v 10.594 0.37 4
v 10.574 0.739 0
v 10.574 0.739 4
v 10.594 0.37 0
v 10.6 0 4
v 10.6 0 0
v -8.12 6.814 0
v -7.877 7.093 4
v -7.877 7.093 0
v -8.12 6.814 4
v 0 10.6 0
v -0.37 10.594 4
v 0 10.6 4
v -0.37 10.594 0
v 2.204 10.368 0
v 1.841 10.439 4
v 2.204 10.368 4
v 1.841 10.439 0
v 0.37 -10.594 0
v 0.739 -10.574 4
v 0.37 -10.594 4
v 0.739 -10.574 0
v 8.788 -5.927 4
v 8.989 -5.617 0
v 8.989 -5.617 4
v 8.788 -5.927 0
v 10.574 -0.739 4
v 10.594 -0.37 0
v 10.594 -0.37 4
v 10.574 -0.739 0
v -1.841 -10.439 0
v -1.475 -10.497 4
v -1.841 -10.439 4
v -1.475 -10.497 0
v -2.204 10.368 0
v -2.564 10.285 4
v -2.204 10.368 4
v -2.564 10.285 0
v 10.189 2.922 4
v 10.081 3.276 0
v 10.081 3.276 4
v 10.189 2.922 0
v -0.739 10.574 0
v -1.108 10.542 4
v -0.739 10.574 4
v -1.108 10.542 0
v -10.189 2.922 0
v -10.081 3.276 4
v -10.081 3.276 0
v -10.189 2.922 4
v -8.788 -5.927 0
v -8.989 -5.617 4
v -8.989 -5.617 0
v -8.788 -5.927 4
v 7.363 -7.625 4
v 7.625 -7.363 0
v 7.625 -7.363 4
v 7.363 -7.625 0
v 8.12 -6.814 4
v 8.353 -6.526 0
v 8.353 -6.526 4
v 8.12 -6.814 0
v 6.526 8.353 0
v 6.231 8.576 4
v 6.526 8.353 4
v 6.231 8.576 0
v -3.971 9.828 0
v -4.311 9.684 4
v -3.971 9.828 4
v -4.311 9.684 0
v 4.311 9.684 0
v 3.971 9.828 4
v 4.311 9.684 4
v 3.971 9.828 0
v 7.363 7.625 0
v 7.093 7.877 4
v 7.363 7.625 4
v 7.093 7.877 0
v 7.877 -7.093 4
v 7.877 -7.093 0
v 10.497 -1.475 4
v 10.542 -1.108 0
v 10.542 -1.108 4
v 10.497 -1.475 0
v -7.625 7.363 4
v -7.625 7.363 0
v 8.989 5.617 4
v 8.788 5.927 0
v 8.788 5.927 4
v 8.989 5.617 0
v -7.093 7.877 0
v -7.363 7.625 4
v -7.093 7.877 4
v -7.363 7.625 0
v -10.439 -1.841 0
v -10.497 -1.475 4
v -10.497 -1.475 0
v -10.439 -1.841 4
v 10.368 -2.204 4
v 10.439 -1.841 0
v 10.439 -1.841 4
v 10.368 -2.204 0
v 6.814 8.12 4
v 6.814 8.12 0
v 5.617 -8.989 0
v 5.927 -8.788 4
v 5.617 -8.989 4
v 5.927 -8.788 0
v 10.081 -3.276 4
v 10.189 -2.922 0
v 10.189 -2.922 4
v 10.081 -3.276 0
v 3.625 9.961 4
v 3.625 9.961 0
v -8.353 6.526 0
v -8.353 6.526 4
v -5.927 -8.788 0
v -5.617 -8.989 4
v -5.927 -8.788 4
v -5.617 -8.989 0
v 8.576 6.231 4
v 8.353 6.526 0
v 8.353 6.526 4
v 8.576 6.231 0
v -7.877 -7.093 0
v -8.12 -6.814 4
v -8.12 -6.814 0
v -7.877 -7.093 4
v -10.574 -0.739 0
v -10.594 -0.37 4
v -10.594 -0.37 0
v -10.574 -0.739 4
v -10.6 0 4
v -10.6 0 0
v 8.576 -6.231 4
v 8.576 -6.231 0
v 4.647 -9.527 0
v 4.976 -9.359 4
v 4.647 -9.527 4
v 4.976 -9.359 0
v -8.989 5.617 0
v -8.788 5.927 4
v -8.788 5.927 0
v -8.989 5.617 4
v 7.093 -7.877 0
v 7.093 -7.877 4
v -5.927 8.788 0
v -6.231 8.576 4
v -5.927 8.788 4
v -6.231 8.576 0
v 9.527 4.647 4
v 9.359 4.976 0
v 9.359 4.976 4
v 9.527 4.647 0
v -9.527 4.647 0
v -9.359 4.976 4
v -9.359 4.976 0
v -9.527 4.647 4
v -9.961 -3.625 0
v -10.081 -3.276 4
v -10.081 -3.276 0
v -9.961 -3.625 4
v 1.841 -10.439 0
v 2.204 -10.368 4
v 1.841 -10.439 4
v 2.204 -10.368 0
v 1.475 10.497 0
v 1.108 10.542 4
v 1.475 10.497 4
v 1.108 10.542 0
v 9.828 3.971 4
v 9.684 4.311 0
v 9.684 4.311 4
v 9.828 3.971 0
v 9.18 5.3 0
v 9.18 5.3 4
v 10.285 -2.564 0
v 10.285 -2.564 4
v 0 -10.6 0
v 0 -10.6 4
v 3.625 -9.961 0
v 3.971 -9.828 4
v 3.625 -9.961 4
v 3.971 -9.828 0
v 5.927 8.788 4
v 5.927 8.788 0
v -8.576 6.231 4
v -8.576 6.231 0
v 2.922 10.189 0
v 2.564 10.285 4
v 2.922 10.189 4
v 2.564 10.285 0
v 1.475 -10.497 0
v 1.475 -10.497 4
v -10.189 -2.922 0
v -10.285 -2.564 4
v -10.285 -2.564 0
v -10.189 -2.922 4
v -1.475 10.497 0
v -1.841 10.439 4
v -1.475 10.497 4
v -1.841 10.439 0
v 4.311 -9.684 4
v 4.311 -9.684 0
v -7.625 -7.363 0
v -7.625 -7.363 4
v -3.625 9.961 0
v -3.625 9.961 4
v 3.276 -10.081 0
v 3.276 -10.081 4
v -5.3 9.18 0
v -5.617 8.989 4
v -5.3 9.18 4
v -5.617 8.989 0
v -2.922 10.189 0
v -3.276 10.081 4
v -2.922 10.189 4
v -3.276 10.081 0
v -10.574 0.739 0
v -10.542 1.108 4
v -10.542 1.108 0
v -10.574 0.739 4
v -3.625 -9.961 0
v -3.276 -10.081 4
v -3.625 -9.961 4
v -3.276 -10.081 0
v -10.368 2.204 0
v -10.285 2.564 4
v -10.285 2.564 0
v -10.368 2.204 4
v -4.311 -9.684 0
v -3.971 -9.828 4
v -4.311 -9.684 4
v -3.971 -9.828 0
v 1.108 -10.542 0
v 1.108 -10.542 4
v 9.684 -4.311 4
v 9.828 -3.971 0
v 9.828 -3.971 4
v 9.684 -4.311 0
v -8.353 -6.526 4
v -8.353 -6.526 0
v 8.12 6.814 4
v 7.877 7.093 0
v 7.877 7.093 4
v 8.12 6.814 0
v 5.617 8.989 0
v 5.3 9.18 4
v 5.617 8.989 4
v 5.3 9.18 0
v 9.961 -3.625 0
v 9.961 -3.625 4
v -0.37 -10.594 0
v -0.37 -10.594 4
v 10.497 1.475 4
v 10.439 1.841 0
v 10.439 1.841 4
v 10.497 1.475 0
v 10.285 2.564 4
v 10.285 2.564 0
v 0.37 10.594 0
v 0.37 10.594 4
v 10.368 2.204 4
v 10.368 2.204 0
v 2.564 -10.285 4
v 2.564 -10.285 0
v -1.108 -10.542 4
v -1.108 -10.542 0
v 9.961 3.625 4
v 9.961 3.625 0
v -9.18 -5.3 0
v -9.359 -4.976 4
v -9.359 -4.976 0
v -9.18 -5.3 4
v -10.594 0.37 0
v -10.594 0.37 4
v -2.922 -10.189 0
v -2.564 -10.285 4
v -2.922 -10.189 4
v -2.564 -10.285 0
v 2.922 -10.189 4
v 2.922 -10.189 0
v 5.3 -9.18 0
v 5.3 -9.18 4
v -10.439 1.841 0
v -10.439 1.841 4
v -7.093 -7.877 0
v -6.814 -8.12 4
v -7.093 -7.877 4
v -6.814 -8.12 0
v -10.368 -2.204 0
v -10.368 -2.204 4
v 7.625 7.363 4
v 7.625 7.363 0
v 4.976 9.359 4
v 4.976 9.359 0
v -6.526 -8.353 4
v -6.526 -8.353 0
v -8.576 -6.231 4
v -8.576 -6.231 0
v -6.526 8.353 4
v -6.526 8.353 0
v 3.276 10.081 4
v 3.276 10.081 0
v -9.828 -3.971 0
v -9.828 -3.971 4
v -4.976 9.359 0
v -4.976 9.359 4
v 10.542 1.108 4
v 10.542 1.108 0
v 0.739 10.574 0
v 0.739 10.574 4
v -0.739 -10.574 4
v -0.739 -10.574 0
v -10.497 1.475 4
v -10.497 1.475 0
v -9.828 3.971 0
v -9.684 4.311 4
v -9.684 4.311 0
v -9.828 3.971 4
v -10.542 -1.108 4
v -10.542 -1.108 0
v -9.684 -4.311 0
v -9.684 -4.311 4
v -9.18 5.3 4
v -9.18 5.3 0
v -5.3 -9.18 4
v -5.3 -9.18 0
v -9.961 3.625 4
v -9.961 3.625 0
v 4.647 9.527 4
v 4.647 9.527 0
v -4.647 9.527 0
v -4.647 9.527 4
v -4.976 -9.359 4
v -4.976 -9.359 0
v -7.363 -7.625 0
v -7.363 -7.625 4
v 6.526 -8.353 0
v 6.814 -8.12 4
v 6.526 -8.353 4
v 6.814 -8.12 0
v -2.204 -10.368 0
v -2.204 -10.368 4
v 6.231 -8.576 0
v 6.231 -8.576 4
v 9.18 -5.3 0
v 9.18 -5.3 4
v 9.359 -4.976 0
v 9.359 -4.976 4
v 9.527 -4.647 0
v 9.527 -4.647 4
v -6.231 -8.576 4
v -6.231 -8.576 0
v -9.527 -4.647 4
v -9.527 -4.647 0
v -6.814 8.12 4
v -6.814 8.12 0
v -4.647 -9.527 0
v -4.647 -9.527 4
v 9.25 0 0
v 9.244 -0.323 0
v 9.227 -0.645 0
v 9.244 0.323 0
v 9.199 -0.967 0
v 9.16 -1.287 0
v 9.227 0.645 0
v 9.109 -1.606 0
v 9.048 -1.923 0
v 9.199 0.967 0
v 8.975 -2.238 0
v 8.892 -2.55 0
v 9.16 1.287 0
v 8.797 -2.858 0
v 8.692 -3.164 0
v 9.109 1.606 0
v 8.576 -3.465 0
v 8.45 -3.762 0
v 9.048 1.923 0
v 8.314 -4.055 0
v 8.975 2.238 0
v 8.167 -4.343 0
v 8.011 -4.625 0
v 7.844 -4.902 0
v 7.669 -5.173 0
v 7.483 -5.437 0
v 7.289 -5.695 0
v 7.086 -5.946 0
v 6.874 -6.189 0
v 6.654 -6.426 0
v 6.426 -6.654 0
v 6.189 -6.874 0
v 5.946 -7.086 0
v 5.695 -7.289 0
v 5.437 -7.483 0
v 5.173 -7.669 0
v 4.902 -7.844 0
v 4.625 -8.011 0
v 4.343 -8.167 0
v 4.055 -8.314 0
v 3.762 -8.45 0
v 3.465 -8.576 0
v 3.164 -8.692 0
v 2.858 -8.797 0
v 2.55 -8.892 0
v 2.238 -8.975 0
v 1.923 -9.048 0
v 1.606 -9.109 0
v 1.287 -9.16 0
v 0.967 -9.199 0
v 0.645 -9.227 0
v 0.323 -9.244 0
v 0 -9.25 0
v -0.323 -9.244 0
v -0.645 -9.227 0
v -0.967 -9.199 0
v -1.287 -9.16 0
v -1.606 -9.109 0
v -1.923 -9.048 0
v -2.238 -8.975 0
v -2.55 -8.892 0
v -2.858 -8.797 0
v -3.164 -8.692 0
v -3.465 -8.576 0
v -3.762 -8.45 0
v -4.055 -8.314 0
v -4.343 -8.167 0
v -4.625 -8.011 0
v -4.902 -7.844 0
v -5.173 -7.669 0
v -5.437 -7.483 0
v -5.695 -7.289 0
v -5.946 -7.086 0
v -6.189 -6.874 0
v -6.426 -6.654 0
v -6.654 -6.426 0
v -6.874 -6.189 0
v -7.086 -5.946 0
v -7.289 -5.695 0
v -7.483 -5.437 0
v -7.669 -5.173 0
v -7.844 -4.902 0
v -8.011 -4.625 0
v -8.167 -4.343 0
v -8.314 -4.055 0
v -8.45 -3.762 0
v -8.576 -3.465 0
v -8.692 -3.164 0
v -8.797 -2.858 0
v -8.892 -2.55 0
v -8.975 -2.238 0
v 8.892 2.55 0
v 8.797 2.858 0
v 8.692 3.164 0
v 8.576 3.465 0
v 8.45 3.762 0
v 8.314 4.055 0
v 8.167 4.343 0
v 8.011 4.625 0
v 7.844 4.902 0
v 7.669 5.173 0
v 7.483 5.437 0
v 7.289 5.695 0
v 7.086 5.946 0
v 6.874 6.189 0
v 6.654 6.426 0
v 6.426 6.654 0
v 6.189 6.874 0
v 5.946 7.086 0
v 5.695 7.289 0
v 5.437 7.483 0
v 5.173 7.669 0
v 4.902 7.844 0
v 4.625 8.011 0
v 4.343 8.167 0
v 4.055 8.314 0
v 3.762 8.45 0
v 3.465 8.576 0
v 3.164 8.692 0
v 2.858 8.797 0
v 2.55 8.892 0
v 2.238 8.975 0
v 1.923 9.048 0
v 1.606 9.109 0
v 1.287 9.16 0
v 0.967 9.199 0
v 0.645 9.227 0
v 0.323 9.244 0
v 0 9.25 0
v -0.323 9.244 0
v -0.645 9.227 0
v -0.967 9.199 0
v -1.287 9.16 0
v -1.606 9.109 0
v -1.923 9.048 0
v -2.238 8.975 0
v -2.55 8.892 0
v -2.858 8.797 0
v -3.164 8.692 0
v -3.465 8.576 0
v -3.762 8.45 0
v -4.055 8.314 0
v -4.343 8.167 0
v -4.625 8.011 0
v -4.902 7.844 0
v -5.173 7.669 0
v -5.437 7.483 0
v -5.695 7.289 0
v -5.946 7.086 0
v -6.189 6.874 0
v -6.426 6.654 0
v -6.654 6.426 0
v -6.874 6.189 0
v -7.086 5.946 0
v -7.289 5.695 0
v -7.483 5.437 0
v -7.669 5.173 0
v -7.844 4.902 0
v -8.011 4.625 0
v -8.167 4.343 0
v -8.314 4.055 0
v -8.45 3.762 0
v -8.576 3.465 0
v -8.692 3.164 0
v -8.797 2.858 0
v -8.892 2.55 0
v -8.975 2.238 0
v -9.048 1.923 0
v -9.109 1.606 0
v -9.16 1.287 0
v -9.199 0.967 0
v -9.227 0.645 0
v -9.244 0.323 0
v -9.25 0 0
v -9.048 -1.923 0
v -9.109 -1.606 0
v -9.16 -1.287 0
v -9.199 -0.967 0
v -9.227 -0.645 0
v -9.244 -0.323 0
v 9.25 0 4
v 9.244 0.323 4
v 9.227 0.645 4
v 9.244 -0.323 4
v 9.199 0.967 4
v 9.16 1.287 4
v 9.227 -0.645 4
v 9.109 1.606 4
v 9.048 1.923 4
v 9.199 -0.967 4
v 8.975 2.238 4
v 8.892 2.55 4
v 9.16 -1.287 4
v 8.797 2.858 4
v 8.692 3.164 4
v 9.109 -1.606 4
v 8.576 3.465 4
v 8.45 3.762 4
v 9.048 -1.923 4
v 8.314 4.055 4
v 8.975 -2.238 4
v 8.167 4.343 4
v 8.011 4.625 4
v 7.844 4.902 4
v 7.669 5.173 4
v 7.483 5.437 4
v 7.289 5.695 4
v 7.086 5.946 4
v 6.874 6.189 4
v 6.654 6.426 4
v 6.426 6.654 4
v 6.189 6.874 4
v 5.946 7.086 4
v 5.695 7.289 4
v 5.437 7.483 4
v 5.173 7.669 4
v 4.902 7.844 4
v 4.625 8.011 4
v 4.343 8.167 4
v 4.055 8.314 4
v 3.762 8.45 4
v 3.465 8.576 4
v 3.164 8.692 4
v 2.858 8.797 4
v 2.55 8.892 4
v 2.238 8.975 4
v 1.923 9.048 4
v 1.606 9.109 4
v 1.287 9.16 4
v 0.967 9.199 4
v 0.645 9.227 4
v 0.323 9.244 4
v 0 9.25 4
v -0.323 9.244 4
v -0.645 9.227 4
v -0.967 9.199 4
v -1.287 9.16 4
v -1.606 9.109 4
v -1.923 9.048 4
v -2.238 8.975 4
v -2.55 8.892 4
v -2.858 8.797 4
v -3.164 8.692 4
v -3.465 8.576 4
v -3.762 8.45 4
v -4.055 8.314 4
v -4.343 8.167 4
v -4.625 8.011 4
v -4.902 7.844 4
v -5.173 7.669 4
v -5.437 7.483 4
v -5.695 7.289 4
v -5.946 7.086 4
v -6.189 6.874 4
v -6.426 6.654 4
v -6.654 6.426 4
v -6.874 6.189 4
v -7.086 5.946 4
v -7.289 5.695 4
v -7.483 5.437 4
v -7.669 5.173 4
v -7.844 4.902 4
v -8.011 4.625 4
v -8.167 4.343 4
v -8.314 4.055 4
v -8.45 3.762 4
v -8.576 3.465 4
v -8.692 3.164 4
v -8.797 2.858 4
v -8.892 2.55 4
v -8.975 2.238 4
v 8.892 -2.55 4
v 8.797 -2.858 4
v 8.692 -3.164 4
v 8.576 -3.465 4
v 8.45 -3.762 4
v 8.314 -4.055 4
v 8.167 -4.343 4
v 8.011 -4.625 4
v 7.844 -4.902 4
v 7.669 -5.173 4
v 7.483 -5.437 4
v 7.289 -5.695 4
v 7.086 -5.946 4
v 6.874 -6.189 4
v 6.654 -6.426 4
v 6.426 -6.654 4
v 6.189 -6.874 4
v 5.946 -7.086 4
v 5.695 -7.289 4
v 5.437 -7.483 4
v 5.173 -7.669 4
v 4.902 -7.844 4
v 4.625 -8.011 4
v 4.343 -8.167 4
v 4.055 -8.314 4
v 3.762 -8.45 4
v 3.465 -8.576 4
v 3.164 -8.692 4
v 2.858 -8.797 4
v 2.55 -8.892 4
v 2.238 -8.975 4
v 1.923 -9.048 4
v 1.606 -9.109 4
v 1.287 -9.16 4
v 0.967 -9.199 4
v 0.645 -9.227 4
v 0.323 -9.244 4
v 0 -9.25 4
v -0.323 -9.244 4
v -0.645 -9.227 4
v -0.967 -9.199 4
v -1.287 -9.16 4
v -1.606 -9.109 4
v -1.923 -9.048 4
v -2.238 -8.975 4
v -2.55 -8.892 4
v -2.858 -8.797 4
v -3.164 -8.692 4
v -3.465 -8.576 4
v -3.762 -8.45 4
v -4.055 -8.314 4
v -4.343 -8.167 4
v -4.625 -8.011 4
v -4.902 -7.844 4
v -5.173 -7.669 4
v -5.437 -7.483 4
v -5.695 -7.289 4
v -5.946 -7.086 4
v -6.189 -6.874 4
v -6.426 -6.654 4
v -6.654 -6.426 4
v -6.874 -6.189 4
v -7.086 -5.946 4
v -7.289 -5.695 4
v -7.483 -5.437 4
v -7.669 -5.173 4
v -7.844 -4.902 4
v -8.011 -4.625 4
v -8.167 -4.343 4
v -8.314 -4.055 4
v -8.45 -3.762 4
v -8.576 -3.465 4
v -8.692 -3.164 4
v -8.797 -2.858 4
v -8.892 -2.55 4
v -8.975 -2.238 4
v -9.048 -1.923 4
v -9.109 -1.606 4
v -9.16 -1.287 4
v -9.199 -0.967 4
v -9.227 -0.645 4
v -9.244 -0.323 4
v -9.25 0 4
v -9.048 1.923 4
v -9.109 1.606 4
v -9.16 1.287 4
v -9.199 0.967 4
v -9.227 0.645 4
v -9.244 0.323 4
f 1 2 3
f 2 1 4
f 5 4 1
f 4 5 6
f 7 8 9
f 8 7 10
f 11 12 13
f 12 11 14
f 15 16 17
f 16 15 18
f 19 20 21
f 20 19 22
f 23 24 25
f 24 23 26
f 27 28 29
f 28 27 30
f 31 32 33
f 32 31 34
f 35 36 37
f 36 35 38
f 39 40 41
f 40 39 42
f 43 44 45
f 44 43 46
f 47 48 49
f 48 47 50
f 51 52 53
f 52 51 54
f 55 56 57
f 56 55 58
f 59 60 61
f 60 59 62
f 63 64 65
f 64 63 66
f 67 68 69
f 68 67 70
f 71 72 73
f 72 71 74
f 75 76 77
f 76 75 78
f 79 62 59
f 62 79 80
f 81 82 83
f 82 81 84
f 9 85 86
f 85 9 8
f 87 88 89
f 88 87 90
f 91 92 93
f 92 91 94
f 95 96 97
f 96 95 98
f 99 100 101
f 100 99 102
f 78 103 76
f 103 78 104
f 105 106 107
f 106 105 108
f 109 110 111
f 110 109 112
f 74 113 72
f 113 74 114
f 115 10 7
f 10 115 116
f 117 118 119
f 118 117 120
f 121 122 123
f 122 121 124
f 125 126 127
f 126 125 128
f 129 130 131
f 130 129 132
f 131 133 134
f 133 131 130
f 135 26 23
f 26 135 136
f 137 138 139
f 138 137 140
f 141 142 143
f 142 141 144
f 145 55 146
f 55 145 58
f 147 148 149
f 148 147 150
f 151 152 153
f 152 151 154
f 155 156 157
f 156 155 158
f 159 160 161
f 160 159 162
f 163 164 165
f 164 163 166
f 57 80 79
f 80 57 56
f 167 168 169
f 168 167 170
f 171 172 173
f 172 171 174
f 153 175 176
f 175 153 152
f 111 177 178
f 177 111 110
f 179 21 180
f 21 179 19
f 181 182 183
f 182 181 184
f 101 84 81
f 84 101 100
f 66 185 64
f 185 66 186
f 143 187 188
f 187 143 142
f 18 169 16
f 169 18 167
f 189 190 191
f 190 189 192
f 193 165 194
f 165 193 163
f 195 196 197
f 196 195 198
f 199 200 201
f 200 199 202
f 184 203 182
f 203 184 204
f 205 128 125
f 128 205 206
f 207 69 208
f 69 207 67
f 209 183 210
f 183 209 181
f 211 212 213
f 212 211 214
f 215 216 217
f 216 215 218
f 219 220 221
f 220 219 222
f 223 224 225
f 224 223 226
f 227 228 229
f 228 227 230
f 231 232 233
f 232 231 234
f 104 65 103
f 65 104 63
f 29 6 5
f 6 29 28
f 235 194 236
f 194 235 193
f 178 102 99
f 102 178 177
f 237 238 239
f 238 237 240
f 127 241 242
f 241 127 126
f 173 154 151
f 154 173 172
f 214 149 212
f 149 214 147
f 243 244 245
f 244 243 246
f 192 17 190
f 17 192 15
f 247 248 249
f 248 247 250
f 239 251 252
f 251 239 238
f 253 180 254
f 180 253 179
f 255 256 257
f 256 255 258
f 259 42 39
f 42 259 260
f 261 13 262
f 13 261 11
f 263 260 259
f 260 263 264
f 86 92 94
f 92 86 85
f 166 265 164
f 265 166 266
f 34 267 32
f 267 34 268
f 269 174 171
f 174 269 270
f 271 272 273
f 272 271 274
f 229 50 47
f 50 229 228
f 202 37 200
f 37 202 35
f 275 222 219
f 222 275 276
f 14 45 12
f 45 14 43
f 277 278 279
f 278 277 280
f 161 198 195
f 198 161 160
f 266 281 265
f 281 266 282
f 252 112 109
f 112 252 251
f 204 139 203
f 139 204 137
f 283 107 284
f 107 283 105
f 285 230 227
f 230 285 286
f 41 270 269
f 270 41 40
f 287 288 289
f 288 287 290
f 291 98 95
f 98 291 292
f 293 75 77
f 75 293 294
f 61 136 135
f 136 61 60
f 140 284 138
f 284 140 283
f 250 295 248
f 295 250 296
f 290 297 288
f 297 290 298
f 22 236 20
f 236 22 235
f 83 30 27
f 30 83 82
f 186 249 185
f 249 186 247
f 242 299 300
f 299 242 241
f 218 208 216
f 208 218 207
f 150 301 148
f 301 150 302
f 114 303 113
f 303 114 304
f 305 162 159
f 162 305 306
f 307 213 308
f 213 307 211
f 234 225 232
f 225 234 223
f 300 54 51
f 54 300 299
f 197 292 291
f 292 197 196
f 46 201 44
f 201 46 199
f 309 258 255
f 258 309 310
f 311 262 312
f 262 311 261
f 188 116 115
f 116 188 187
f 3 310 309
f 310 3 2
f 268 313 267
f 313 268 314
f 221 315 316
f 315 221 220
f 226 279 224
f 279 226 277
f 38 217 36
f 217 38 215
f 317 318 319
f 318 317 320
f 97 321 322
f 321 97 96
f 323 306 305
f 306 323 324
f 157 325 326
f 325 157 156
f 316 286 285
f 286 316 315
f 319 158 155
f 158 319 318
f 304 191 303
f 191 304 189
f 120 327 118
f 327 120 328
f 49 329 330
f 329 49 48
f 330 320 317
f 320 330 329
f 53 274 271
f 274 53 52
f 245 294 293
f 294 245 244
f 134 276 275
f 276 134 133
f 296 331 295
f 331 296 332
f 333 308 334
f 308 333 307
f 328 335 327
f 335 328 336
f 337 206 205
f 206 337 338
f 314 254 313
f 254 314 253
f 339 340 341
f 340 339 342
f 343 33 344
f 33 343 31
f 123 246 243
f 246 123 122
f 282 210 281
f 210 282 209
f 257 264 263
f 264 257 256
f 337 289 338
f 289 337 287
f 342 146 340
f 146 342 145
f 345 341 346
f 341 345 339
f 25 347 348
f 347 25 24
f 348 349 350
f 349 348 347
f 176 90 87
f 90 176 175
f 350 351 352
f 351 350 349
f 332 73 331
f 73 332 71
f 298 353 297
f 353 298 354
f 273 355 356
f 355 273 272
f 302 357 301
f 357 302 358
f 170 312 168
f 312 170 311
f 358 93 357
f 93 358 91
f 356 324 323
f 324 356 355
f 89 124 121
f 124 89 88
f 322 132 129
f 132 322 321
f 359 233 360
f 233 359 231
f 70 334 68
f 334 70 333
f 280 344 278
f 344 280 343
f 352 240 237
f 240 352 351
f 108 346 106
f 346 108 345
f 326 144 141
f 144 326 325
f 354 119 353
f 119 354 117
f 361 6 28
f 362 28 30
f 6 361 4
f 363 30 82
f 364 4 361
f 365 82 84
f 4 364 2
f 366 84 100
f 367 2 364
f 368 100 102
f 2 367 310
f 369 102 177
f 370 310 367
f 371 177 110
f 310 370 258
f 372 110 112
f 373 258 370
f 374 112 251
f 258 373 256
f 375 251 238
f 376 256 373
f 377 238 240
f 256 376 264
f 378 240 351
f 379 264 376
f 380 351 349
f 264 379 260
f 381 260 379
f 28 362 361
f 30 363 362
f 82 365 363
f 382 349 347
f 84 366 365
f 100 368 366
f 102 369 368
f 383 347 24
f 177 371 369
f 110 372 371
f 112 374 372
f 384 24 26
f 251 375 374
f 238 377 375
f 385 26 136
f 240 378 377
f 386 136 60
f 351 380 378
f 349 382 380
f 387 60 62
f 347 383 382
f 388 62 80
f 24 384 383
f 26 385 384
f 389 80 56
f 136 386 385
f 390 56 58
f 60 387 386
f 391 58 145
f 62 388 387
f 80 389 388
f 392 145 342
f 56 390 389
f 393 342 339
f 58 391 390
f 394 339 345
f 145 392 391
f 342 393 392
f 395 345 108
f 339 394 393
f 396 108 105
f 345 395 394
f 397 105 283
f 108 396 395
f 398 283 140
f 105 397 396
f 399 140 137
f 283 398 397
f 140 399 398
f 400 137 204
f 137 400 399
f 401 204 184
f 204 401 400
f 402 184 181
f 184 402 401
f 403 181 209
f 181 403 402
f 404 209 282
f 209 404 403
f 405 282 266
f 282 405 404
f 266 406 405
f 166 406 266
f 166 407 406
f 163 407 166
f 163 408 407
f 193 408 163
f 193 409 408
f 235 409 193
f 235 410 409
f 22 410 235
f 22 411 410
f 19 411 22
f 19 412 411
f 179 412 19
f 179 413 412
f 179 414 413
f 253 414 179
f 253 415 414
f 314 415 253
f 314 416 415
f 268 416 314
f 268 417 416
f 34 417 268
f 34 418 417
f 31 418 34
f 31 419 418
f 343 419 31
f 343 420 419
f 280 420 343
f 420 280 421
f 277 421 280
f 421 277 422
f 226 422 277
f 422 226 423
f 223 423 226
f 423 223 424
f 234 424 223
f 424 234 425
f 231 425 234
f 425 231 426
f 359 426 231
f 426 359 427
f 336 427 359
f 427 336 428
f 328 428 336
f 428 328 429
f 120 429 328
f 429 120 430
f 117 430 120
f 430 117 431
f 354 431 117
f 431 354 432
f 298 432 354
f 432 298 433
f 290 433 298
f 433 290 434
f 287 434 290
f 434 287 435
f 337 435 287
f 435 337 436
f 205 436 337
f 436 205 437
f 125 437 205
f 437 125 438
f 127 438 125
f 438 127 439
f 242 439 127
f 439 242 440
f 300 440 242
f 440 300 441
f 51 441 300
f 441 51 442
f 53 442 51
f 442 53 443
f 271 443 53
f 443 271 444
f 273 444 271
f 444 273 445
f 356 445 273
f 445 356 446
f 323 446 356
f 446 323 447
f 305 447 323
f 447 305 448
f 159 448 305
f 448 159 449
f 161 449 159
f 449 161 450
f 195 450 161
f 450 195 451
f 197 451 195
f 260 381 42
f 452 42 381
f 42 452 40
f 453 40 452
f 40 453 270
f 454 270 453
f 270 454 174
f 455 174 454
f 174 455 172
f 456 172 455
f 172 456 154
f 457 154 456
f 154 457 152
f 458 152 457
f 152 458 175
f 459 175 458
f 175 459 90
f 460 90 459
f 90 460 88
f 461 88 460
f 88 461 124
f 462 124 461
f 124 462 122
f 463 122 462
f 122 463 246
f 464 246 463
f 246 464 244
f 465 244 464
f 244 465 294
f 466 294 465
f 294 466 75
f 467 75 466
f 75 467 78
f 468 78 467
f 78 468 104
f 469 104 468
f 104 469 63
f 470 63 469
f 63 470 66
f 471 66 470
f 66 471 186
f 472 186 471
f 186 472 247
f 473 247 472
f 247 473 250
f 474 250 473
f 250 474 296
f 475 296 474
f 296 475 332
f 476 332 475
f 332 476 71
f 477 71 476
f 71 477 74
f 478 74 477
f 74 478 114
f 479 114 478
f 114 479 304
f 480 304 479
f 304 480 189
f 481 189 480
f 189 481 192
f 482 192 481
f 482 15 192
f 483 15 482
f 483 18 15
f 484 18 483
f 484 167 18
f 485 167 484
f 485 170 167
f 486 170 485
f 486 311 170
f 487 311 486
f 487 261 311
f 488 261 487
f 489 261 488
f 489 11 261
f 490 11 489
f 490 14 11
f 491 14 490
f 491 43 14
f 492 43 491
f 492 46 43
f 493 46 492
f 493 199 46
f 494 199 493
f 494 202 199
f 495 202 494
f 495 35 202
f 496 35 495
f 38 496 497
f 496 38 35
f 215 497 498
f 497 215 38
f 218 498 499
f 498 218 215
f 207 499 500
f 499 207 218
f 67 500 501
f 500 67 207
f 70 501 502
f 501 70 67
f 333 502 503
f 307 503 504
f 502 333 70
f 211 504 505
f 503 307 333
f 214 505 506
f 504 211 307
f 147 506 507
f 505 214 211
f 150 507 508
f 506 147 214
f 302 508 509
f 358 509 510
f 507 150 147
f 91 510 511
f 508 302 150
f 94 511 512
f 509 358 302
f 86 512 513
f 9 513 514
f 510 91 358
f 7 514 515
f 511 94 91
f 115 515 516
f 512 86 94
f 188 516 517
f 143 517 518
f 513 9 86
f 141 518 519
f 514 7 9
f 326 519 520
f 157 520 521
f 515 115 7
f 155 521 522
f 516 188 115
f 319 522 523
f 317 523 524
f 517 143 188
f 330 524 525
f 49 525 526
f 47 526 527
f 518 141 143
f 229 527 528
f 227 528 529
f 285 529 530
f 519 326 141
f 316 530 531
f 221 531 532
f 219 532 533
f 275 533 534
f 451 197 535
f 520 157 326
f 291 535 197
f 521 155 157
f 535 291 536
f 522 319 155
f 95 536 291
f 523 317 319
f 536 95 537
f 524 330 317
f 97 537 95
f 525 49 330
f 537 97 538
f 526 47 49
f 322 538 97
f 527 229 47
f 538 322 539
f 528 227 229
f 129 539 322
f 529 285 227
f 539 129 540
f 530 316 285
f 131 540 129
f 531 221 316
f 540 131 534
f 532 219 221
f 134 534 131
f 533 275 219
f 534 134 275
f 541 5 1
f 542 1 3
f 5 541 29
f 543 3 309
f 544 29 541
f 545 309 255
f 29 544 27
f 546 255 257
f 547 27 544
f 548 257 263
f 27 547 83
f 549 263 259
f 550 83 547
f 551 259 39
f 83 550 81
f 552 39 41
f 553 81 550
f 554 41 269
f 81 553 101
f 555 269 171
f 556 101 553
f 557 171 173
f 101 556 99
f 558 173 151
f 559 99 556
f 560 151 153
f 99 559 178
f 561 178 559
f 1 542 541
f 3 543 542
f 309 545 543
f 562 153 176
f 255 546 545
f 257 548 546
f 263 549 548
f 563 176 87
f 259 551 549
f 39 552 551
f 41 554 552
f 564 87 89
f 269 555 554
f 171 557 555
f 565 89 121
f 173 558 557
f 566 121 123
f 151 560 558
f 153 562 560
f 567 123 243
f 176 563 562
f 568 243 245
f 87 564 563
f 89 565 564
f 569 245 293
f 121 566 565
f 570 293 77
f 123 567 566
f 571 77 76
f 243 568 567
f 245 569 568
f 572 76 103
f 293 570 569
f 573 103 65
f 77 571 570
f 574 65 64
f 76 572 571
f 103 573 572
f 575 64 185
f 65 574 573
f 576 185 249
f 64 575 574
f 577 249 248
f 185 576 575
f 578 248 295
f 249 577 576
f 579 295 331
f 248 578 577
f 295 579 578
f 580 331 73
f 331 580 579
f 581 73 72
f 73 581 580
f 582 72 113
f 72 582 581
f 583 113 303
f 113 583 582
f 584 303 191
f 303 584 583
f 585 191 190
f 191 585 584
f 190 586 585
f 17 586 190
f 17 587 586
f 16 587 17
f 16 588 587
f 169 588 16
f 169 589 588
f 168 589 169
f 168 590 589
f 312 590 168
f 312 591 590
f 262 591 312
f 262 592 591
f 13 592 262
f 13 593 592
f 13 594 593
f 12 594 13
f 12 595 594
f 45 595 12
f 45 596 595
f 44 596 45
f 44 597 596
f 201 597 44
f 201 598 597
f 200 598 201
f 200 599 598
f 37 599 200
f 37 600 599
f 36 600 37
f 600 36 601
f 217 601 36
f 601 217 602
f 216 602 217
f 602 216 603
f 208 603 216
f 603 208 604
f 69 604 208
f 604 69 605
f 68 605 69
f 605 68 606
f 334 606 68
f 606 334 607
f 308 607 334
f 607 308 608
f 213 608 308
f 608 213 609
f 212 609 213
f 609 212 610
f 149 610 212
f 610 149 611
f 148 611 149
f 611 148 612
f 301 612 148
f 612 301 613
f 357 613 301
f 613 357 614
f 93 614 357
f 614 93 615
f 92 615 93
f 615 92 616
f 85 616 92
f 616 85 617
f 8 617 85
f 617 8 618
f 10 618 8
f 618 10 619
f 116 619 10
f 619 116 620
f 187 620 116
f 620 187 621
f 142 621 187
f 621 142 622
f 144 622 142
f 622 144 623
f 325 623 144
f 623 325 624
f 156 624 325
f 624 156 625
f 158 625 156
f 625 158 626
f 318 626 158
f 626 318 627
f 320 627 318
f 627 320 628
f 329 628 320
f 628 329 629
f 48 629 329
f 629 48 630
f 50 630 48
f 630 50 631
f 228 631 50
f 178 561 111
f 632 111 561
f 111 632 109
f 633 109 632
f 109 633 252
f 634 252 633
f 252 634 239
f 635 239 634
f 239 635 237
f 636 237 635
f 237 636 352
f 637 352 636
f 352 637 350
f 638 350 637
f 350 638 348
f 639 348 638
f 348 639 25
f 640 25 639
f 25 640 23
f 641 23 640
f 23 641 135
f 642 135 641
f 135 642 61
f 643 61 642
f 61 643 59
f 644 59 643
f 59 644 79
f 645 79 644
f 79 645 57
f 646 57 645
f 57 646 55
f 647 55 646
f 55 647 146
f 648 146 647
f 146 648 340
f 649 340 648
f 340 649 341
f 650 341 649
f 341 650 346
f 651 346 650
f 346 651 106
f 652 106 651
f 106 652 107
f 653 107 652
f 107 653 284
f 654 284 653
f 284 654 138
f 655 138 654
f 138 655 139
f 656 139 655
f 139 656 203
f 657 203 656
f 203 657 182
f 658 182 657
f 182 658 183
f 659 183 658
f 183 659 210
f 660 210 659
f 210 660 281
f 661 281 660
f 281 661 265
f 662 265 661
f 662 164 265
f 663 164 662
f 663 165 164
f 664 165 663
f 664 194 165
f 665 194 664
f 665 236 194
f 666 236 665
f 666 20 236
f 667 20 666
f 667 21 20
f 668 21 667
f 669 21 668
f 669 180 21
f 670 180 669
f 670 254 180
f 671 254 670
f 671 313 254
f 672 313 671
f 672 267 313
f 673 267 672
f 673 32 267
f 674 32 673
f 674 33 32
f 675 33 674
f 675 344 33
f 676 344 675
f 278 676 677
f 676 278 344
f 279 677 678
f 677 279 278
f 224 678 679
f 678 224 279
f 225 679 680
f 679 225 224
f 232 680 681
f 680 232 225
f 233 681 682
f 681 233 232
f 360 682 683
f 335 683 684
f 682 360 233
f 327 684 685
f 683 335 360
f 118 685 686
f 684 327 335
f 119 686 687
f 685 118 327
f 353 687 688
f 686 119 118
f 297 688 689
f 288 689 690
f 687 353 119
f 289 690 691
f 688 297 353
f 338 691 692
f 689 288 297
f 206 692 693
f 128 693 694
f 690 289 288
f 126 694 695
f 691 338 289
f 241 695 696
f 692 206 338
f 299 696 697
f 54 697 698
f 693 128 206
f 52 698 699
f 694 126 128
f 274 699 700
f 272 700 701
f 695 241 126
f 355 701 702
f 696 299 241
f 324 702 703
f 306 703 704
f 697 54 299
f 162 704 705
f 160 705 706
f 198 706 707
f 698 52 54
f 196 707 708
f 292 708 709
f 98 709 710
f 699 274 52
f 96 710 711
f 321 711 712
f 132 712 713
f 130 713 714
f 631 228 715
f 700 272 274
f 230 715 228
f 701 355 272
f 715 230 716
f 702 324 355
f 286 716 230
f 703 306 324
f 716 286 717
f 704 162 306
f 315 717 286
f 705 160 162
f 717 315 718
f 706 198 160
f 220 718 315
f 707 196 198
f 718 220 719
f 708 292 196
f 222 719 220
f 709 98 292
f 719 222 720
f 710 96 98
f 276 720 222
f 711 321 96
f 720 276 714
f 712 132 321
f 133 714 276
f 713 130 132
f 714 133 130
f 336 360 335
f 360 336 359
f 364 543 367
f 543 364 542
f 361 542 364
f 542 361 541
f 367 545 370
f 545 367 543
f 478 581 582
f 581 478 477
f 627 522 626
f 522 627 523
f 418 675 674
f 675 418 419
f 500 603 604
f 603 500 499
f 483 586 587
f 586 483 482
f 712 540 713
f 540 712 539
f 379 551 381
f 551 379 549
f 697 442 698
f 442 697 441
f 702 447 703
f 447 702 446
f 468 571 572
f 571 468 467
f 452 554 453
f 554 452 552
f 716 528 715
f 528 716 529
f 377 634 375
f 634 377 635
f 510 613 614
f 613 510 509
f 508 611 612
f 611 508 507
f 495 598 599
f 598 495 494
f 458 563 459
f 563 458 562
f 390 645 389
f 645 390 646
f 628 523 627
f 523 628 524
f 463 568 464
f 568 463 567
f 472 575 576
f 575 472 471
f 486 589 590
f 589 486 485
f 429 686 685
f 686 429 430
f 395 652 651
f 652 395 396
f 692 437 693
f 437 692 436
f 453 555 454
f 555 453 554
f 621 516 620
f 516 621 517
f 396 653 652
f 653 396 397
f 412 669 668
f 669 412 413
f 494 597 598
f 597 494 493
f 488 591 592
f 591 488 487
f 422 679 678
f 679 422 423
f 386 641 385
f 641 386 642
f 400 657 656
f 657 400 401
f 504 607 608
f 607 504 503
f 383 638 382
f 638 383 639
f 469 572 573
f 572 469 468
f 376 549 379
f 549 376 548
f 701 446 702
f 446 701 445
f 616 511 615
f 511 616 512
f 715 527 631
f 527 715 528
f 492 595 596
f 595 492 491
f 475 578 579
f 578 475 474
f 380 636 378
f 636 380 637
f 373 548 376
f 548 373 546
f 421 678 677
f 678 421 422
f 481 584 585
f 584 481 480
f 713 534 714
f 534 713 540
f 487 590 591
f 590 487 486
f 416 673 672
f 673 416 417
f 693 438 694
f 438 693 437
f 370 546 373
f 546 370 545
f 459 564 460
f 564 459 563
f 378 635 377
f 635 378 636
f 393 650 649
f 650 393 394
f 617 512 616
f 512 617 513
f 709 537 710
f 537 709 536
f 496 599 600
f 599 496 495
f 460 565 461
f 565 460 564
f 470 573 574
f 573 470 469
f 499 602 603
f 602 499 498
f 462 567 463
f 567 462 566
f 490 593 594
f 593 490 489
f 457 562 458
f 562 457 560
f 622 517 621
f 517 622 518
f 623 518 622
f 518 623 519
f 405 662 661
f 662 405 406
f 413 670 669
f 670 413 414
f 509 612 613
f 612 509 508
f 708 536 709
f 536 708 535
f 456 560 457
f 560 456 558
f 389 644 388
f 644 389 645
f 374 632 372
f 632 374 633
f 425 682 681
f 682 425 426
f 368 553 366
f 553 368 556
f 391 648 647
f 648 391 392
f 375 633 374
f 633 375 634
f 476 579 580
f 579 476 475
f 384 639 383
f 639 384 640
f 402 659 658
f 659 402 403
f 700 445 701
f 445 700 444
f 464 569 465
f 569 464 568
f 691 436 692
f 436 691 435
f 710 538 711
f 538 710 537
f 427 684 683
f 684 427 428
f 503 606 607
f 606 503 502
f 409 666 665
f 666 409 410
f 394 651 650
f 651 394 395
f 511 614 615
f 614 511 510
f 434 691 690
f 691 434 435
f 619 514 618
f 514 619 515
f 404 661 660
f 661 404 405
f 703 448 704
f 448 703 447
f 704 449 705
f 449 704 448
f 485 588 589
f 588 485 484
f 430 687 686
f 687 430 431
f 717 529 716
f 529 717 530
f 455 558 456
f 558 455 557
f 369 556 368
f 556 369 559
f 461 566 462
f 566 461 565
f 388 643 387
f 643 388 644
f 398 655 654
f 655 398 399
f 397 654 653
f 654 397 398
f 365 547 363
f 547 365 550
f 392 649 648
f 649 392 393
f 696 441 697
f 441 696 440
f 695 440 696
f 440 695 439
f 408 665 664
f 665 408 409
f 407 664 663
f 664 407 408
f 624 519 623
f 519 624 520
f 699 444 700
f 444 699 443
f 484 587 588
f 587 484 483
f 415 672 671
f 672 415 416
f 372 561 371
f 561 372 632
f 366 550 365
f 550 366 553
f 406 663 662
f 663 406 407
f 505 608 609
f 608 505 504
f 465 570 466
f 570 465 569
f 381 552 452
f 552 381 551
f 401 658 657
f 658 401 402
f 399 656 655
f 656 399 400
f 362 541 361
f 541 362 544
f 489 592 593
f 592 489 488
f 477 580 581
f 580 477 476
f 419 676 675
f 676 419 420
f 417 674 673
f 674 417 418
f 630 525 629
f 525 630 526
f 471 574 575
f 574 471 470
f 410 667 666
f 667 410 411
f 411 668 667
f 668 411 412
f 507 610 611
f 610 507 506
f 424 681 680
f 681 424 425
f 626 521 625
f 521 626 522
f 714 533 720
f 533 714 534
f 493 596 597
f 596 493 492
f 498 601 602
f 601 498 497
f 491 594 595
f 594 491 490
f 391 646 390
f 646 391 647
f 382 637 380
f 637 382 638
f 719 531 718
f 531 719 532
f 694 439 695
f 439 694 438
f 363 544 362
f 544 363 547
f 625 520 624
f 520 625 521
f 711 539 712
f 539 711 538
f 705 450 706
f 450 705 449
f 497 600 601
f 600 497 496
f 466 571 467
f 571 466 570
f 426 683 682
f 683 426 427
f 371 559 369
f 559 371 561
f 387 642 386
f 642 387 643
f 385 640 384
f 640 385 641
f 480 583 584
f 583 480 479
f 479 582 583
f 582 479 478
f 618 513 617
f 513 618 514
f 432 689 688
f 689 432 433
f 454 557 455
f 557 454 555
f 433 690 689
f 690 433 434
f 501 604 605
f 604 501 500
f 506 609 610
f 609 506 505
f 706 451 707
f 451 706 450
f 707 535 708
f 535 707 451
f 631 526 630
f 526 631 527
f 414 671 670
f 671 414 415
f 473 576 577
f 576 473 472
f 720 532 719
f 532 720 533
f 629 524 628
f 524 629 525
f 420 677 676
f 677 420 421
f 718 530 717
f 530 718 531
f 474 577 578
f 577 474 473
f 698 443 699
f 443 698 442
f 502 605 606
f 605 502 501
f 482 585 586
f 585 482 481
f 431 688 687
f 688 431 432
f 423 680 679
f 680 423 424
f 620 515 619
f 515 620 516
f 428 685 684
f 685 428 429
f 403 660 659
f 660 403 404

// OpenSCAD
$fn = 180;

H     =  4.0;
OUTER = 21.2;
INNER = 18.5;

EPS = 0.01;
EPS2 = 2 * EPS;

difference() {
    cylinder(h=H, d=OUTER);
    translate([0, 0, -EPS]) cylinder(h=H + EPS2, d=INNER);
}
